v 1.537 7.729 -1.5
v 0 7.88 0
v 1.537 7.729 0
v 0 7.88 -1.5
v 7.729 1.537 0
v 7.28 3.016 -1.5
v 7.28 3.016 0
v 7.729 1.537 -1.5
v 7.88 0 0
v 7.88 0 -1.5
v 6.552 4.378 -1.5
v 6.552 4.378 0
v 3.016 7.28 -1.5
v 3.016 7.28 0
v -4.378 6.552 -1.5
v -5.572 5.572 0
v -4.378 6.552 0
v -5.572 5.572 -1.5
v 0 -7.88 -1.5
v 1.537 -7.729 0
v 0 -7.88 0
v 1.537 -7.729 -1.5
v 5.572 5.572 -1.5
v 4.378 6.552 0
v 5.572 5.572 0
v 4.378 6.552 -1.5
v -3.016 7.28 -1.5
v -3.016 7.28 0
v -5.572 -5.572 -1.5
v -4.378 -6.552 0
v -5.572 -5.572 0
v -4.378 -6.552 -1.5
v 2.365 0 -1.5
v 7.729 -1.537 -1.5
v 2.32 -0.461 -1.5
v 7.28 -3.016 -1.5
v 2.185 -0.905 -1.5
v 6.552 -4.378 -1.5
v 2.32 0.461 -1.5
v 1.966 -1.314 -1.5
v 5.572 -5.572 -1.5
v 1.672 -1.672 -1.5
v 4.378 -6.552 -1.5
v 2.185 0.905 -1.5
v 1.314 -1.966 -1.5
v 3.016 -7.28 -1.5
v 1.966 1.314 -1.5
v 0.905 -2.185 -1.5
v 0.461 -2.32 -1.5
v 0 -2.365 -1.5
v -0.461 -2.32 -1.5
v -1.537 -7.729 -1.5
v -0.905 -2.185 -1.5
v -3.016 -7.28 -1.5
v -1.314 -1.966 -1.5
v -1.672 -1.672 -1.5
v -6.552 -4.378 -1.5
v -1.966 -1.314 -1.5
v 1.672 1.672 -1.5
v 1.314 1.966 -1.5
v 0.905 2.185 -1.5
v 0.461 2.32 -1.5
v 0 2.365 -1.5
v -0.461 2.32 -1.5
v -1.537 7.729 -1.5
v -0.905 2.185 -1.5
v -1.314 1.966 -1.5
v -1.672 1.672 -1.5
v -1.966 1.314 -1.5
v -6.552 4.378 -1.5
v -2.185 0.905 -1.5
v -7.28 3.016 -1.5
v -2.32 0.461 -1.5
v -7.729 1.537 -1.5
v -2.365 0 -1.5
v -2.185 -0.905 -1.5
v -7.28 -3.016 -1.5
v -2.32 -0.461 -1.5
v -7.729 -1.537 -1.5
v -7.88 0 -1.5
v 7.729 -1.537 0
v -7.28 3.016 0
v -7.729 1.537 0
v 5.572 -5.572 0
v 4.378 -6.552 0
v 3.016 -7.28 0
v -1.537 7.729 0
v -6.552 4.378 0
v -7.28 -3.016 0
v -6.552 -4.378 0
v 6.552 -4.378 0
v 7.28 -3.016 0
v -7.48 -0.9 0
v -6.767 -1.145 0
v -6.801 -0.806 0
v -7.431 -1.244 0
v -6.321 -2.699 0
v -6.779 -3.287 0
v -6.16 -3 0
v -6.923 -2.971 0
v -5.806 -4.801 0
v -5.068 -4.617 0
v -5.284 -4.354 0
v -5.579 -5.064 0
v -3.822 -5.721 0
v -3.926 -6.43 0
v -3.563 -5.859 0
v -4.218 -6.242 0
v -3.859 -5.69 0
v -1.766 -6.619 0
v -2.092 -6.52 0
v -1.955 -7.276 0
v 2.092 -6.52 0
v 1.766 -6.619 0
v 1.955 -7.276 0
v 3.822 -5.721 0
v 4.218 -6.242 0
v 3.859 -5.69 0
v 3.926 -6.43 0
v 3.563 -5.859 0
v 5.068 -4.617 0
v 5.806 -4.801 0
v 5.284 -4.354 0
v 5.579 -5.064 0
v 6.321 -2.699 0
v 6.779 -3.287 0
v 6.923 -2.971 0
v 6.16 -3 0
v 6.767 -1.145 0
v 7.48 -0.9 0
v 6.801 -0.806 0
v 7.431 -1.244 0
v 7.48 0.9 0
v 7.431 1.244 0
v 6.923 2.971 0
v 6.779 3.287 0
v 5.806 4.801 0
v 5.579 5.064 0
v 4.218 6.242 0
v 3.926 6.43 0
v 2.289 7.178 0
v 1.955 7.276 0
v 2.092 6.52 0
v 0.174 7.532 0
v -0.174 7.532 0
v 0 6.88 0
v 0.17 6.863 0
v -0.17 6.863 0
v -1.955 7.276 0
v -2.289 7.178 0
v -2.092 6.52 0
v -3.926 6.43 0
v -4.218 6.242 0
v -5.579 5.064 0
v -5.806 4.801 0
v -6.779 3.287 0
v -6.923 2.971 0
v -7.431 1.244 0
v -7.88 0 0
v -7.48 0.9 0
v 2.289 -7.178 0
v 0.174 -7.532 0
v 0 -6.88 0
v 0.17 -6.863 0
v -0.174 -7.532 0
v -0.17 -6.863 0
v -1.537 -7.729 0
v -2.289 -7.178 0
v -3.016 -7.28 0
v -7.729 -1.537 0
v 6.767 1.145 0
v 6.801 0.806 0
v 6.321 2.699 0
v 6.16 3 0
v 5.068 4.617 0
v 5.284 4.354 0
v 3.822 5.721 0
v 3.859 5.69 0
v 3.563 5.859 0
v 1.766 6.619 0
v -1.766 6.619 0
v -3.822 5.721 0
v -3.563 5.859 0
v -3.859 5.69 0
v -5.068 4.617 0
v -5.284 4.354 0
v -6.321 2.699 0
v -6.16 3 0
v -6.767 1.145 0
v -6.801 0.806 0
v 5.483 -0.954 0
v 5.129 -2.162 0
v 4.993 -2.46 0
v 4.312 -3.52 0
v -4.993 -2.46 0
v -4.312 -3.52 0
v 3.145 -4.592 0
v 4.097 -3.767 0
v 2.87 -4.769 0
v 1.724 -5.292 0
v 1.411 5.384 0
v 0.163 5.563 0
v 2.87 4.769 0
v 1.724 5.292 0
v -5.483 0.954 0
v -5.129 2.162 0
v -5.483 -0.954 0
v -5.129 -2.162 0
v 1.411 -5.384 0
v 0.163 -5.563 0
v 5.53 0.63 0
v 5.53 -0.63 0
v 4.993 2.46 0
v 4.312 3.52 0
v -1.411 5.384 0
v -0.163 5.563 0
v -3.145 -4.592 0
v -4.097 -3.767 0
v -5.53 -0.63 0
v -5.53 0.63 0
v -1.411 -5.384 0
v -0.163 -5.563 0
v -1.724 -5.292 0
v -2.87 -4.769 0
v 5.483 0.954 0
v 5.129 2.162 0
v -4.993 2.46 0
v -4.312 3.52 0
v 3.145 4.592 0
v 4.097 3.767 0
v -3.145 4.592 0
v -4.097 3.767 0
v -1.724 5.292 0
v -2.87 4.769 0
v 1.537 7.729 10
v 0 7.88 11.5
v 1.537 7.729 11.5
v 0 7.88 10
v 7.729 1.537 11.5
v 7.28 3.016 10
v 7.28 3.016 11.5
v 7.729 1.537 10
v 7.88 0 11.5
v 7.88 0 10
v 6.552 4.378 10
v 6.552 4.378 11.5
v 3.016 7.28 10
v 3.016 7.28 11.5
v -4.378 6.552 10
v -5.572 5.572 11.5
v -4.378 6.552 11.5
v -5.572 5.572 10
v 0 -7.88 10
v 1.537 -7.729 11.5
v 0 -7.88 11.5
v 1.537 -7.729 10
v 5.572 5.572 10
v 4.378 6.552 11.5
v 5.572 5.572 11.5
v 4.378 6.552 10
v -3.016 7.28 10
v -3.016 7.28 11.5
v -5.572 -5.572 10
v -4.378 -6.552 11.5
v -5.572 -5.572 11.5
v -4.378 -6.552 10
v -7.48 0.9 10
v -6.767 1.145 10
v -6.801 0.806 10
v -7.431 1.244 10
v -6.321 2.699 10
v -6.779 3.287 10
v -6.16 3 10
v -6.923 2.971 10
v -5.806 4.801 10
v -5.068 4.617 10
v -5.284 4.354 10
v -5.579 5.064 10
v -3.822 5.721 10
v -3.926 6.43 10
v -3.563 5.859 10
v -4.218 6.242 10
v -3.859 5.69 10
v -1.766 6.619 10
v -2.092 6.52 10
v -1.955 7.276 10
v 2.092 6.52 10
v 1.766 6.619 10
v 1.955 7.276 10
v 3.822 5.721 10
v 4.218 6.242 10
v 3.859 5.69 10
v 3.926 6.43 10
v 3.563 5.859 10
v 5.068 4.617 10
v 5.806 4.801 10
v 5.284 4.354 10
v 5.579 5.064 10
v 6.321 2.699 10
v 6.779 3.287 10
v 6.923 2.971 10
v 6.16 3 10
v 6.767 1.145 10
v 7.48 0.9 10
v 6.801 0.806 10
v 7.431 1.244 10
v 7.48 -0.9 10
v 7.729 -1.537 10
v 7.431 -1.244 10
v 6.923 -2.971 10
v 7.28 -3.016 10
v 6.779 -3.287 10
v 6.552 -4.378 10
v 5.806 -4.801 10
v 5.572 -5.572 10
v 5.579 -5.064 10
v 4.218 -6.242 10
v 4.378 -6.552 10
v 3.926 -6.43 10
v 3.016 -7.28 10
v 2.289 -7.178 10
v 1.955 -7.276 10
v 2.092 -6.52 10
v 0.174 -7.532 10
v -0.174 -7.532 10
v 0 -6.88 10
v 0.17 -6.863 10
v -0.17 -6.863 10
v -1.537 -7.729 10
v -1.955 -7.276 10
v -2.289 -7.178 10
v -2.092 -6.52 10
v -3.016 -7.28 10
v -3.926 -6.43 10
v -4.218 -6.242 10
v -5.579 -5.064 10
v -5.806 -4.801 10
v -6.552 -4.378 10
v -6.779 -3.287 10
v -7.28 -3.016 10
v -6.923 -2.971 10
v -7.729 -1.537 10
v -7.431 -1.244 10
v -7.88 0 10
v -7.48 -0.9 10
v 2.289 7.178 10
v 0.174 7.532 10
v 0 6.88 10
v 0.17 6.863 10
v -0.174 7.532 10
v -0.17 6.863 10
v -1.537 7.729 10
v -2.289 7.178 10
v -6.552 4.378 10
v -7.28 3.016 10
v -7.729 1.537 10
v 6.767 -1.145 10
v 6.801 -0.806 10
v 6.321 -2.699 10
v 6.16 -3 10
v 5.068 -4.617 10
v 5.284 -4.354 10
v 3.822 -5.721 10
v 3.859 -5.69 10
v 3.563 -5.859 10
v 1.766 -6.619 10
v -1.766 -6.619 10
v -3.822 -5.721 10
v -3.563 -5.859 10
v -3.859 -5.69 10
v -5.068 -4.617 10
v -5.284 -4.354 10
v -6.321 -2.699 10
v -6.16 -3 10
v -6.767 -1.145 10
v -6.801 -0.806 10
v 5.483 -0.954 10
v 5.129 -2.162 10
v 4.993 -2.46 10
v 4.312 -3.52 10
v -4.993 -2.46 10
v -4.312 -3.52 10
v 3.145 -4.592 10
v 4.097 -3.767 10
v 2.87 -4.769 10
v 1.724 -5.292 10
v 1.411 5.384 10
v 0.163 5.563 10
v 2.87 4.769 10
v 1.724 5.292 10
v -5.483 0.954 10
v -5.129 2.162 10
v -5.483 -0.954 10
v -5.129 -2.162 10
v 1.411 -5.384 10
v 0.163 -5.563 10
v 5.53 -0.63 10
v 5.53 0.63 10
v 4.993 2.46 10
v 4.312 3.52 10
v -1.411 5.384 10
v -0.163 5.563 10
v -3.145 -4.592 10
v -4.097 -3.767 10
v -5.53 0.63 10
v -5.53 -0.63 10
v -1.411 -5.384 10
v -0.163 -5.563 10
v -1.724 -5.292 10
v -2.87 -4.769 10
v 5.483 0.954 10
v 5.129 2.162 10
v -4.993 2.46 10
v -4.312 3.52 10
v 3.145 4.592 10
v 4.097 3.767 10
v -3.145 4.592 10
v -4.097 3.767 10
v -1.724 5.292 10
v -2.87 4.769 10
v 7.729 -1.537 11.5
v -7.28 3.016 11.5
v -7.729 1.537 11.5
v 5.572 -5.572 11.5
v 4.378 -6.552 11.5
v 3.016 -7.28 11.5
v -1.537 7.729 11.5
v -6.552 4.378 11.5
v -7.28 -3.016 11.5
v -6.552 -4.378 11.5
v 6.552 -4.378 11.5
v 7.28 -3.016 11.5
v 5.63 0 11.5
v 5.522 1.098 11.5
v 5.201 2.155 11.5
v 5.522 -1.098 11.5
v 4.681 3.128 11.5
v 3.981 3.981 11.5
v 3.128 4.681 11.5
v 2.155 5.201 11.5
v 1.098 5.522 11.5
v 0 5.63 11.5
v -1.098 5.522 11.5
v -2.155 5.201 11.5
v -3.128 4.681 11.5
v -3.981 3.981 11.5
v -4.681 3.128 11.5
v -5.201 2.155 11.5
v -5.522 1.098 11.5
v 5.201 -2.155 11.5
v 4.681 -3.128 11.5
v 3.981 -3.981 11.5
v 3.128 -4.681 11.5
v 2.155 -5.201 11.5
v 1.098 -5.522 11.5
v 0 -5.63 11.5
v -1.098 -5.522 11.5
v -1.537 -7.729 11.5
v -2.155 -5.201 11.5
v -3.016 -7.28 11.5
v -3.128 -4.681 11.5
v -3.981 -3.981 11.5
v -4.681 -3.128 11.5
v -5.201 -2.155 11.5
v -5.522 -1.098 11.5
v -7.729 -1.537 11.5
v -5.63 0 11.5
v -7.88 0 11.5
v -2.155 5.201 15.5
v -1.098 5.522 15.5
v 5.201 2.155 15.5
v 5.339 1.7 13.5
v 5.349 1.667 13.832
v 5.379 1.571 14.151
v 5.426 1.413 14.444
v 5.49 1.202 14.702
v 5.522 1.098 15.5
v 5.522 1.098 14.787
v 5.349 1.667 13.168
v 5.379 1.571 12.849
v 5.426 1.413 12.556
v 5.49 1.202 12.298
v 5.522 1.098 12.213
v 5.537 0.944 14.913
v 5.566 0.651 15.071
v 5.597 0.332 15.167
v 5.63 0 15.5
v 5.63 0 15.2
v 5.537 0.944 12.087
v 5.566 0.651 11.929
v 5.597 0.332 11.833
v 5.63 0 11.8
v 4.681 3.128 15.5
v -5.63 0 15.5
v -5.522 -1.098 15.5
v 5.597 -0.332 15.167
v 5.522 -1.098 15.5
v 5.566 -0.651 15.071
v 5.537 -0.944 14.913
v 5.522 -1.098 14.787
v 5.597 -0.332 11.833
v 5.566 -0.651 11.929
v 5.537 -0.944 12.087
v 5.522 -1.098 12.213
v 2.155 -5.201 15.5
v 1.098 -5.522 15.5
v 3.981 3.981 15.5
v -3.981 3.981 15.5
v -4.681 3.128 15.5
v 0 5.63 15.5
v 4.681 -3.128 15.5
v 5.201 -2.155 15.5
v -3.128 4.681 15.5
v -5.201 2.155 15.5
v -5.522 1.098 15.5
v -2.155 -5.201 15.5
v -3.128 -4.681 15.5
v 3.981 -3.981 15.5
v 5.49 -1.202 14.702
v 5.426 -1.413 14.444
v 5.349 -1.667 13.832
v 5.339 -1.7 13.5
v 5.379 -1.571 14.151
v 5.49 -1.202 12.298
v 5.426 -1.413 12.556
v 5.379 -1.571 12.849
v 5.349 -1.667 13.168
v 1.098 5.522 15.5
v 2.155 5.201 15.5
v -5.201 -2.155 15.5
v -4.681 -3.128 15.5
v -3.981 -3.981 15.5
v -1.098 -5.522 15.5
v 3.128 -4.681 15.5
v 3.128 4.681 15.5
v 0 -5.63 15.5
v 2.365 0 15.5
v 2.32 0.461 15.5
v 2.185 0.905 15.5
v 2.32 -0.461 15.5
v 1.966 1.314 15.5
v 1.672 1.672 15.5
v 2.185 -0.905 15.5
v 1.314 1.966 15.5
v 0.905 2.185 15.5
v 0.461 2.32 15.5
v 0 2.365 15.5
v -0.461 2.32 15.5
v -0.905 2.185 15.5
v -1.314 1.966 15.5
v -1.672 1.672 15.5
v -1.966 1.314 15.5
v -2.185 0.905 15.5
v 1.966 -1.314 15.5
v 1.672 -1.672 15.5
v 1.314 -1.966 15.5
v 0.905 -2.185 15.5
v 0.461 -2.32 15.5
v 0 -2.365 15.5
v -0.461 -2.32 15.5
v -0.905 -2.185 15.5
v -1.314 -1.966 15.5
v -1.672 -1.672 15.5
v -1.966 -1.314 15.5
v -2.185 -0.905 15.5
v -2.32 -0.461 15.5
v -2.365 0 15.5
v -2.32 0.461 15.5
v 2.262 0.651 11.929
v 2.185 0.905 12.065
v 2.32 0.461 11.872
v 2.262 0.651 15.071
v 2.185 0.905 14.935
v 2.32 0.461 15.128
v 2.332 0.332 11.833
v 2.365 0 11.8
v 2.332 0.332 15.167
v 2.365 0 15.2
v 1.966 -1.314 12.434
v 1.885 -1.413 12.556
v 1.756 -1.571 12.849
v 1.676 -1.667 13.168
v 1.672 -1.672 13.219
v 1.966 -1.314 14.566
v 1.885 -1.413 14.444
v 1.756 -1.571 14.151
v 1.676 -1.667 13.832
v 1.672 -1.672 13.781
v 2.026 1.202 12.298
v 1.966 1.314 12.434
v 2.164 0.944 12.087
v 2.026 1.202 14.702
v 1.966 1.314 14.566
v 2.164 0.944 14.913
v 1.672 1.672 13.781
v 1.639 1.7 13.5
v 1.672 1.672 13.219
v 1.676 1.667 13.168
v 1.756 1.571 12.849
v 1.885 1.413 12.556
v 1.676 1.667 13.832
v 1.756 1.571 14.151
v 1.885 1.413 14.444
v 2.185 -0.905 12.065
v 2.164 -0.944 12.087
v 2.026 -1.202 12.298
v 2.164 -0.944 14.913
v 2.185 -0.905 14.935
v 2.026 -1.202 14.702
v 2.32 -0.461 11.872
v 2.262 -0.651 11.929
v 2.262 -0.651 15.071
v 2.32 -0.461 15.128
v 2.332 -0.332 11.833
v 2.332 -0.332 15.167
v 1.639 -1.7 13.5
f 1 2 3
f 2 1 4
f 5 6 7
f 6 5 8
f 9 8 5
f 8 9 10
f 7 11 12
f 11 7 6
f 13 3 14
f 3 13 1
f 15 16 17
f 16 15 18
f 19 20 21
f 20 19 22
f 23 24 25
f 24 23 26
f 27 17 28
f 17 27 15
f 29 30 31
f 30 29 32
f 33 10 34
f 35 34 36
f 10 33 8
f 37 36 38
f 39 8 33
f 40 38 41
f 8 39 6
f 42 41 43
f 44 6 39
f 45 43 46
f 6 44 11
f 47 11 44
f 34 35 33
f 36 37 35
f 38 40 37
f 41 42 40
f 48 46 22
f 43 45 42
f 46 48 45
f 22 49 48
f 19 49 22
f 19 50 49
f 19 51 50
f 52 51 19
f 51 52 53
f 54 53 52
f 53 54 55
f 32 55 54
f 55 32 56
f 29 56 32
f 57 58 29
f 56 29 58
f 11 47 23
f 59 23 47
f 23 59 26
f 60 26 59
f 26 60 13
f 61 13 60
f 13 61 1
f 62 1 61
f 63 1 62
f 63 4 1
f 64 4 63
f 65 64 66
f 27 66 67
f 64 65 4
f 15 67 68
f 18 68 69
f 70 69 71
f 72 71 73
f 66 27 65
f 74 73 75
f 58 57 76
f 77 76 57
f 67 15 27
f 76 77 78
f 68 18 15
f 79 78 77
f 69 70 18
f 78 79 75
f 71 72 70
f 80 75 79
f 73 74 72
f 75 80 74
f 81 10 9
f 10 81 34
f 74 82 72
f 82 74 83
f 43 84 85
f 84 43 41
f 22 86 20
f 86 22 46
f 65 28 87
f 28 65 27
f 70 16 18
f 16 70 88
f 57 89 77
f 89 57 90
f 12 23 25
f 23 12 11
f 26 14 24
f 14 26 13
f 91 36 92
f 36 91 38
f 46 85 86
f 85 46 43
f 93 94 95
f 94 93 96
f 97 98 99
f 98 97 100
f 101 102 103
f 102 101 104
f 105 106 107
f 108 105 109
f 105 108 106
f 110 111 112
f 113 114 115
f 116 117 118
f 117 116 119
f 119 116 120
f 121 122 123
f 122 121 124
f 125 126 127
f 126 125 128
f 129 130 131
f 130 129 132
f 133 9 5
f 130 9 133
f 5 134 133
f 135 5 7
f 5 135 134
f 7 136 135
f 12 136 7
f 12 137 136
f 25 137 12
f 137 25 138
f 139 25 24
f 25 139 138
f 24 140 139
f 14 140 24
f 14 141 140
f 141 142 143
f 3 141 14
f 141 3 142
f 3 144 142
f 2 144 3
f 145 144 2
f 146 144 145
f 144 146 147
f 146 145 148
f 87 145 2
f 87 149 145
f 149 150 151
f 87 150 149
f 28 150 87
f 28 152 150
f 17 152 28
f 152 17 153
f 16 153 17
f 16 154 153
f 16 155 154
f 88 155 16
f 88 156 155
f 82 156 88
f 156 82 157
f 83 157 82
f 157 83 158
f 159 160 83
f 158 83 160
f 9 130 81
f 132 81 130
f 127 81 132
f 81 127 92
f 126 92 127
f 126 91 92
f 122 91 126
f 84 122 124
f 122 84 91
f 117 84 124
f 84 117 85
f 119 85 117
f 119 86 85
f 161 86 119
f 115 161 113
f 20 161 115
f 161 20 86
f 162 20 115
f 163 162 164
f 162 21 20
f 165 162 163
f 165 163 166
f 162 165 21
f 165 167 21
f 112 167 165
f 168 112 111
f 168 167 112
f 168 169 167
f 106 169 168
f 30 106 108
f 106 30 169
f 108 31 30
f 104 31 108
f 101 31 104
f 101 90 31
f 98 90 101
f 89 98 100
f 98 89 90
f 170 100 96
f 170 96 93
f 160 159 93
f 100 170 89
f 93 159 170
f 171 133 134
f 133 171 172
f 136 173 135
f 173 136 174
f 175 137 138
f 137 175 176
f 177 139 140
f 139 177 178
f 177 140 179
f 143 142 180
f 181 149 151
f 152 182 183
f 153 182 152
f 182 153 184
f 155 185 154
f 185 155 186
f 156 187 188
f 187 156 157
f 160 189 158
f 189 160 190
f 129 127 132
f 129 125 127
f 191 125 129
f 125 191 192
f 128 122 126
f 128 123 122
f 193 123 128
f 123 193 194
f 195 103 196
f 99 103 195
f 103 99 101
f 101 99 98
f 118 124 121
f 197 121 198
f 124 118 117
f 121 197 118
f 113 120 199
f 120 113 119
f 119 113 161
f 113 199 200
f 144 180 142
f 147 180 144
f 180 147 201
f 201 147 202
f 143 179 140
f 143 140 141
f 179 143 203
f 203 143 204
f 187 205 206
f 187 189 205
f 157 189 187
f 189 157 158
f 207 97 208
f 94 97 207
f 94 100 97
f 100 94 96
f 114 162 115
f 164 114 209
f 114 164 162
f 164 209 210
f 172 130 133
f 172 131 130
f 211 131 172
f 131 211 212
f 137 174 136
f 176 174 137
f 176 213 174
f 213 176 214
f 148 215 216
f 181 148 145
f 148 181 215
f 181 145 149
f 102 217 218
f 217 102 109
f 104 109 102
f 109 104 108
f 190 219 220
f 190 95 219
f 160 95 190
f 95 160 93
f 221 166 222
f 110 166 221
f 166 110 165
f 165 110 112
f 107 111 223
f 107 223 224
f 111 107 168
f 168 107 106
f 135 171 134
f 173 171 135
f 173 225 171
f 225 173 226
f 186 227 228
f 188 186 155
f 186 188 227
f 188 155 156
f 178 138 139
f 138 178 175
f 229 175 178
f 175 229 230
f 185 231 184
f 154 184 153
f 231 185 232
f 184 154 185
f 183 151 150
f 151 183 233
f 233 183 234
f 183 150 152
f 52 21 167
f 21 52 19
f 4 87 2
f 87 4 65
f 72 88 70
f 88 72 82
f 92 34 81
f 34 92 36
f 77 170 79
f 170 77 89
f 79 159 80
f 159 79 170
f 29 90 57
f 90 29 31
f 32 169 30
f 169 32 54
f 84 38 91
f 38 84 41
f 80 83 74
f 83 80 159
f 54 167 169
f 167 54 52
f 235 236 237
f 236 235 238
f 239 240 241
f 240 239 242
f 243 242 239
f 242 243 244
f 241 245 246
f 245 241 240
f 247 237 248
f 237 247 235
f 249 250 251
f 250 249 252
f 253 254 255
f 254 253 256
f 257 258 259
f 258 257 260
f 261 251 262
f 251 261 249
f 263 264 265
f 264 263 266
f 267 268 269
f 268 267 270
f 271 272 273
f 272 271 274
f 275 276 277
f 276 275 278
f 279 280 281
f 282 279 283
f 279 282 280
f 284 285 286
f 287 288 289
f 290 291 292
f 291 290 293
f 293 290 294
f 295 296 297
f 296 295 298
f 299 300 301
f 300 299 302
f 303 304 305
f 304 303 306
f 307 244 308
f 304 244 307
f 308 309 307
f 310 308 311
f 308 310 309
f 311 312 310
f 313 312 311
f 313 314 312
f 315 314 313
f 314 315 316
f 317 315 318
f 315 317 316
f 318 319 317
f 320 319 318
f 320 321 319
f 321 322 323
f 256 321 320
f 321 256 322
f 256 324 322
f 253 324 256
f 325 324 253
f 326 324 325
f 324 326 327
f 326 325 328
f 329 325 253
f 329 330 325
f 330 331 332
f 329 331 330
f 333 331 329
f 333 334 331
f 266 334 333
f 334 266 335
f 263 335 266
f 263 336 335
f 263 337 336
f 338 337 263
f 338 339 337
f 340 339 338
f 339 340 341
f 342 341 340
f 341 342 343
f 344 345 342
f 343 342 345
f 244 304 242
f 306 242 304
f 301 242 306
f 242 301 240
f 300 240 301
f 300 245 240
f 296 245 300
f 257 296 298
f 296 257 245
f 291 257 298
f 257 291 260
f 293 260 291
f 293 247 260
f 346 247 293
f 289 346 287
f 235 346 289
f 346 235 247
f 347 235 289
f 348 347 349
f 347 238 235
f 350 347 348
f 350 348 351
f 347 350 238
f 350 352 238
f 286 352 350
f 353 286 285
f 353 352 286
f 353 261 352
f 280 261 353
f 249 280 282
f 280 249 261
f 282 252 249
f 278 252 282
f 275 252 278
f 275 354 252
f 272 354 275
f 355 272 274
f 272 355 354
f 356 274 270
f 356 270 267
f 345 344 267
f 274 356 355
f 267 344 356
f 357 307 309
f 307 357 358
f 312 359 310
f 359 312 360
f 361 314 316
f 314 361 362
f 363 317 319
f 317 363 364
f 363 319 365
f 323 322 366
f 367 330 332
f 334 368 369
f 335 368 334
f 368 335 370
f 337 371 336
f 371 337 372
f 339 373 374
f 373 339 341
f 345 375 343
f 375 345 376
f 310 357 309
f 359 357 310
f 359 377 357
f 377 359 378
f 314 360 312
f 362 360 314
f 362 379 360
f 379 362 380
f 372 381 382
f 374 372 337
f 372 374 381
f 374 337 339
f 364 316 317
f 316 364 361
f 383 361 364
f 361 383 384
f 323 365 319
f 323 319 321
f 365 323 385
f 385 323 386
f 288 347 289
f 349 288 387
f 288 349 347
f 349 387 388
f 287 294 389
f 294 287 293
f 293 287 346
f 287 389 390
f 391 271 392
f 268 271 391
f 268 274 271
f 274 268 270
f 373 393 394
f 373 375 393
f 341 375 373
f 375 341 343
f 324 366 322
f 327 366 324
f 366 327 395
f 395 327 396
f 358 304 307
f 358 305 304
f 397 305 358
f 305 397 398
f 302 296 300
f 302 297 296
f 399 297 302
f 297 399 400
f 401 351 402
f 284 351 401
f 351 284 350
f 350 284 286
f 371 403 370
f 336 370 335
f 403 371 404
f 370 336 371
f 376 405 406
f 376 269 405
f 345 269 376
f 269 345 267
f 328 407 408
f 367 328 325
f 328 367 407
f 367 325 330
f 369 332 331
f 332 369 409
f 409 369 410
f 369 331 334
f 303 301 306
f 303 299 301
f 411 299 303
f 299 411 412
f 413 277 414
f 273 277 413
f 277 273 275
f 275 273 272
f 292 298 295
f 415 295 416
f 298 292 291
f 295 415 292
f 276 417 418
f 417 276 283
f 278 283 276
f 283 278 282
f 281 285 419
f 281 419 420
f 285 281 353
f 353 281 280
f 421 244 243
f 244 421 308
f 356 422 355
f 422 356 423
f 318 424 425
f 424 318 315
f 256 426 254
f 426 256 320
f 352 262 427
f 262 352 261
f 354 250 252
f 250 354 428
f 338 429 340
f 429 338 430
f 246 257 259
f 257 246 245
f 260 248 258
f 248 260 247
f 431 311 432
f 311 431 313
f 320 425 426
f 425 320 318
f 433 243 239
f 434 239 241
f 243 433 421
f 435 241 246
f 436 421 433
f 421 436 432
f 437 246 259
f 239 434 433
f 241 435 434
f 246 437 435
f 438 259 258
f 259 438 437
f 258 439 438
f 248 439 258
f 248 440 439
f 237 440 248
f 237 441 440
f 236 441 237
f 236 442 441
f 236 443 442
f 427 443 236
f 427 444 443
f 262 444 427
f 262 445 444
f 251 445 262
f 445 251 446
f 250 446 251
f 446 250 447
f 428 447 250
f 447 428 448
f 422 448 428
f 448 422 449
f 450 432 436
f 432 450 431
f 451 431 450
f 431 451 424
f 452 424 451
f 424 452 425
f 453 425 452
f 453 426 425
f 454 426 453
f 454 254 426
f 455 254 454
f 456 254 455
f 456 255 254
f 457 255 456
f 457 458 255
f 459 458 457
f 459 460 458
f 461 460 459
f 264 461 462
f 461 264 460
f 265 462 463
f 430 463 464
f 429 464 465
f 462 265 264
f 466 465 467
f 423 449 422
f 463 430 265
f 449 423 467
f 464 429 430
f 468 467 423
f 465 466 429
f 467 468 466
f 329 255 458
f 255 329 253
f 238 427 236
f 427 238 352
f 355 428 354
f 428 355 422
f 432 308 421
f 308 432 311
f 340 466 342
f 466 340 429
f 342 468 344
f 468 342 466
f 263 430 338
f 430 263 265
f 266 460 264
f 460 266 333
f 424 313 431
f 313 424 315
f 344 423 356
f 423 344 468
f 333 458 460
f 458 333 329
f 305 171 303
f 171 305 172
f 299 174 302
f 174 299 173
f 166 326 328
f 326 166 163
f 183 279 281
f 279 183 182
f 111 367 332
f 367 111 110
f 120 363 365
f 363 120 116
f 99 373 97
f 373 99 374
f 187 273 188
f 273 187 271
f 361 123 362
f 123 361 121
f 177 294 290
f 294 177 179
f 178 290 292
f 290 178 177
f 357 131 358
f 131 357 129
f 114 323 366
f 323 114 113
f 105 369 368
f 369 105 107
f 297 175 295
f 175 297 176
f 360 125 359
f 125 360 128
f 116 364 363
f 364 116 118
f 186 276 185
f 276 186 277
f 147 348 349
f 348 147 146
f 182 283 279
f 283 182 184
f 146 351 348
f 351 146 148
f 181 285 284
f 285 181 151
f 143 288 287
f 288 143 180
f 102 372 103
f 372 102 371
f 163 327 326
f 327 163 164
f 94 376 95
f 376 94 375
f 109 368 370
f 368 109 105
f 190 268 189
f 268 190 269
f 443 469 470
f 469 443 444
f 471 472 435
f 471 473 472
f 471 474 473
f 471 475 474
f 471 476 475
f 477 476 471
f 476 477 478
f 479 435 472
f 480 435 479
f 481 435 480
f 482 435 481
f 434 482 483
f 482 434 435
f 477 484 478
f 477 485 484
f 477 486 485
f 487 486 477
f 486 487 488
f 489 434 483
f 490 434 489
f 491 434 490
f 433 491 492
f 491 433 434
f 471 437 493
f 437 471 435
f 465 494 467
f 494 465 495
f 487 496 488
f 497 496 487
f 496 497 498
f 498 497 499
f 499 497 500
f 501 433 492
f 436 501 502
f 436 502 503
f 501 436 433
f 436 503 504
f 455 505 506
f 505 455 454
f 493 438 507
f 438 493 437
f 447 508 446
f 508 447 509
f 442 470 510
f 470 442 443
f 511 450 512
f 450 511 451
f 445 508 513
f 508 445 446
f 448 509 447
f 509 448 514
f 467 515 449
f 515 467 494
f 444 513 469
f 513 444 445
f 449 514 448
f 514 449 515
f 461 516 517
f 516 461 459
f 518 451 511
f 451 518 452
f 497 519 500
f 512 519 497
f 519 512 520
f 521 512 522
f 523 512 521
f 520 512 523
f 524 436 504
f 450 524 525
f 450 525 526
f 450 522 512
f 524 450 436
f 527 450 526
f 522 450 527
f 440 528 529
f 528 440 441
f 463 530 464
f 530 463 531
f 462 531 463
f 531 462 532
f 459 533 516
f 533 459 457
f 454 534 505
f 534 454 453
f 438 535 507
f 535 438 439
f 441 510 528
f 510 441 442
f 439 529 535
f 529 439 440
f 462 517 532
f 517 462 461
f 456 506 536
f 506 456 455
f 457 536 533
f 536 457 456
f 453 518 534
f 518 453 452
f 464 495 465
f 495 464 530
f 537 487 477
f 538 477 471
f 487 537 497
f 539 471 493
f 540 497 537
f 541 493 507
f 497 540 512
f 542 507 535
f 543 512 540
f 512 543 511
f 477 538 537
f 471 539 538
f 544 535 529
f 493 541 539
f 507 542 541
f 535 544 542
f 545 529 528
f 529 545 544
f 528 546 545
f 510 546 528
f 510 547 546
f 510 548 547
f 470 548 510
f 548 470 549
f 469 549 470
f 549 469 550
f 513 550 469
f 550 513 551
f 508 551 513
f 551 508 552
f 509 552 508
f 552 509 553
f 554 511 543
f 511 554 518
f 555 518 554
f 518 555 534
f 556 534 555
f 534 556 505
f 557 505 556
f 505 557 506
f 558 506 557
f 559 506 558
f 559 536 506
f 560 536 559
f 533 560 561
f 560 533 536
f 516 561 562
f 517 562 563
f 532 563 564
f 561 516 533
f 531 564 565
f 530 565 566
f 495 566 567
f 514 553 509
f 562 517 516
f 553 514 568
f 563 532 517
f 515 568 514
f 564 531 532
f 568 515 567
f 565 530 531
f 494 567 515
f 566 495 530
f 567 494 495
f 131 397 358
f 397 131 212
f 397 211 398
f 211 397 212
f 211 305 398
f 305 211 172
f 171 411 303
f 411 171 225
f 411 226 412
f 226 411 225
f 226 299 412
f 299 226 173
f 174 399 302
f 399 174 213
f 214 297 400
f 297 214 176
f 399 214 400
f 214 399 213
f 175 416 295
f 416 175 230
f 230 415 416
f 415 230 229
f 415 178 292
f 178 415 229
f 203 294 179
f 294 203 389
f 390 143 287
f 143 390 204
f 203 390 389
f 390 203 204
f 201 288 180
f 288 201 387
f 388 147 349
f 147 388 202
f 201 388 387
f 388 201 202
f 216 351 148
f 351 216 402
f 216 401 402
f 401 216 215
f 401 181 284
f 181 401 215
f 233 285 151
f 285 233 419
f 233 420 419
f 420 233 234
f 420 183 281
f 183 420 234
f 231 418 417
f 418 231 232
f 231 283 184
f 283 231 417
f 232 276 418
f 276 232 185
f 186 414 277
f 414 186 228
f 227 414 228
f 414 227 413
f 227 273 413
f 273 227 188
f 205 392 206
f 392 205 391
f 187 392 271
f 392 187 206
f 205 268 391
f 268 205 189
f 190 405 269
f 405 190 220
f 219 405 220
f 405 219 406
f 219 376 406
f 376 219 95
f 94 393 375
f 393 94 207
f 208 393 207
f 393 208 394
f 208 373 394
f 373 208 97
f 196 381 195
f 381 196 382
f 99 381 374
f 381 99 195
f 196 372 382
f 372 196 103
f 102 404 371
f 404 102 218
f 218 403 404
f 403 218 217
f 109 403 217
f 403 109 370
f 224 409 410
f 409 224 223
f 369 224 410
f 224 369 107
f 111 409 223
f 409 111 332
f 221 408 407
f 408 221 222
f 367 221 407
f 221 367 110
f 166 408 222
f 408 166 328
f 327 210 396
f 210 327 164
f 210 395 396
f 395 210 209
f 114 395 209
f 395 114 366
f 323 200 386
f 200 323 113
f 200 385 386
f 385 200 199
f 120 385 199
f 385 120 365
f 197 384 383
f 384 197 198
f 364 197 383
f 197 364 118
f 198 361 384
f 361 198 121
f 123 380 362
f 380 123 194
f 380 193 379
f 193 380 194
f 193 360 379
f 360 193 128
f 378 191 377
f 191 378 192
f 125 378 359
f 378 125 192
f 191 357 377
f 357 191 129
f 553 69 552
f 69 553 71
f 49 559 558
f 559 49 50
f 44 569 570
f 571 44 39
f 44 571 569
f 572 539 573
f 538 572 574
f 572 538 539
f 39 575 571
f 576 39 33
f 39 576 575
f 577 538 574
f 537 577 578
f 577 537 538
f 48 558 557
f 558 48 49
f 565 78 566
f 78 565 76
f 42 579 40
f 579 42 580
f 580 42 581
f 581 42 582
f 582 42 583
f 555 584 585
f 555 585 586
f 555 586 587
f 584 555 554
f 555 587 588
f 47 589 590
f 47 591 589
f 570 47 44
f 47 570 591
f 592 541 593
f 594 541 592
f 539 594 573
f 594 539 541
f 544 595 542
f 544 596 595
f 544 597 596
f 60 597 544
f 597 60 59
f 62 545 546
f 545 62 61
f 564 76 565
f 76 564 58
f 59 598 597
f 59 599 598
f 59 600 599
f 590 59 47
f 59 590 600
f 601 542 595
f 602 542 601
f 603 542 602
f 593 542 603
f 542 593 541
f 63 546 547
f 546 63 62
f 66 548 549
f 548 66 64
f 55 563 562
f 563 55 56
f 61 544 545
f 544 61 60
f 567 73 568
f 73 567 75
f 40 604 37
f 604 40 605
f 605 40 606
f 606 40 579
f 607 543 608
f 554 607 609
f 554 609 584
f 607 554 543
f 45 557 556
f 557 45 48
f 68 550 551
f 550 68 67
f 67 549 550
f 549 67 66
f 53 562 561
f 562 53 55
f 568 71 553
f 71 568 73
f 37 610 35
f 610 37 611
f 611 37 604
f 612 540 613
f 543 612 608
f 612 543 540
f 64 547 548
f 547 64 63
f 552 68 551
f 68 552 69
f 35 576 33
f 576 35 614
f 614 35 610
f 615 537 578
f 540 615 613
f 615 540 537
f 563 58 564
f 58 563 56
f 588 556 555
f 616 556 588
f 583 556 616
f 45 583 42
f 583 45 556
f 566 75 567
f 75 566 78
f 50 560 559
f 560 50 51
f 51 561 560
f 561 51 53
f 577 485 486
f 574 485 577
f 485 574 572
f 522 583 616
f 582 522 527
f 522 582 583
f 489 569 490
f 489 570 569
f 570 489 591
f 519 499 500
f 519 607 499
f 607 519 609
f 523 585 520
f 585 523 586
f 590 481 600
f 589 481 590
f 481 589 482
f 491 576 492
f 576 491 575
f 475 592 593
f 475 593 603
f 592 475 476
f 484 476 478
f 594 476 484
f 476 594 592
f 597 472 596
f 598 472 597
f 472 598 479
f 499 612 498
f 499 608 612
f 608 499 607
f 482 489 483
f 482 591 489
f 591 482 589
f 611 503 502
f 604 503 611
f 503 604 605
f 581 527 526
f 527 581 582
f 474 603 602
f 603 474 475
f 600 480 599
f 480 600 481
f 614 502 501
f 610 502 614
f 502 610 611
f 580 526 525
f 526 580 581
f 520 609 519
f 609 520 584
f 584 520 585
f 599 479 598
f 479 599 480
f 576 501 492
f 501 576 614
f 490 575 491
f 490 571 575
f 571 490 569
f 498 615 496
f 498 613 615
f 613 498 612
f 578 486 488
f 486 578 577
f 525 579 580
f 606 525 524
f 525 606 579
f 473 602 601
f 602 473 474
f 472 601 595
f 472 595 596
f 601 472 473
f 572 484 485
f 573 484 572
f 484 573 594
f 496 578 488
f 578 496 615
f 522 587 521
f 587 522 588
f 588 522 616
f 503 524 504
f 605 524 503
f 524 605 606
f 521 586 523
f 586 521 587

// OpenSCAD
$fn = 32;

// ----------------------------------------------------------------------
// Timing pulley: GT2 22T, pitch 2 mm, 15.76 mm x 17 mm
// ----------------------------------------------------------------------

// --- parameters (mm) ---
pitch_mm = 2;             // belt pitch
tooth_count = 22;         // number of grooves
width = 10;               // belt width between the flanges
tip_d = 13.76;            // tip circle diameter
root_d = 12.26;           // groove bottom diameter
groove_h = 0.75;          // groove depth
tooth_w = 1.5;            // groove width at the tip circle
side_d = 15.76;           // flange diameter
side_t = 1.5;             // flange thickness
spigot_d = 10.66;         // flange spigot, sunk into the rim
spigot_h = 1.2;           // spigot depth into the rim
hub_bore = 4.73;          // shaft bore
hub_d = 11.26;            // hub diameter
hub_h = 4;                // hub above the flange
bottom_z = -1.5;          // lowest point of the pulley
top_z = 15.5;             // highest point of the pulley
set_d = 3.4;              // set screw tap hole

module rim() {
  cylinder(h = width, d = tip_d);
}

module groove_cutter() {
  /* belt tooth groove: deeper than wide, cut through the belt width */
  translate([root_d / 2, 0, 0])
    linear_extrude(height = width)
      polygon(points = [[-0.6, -tooth_w * 0.42], [groove_h + 0.6, -tooth_w * 0.6],
                        [groove_h + 0.6, tooth_w * 0.6], [-0.6, tooth_w * 0.42]]);
}

module flanges() {
  translate([0, 0, -side_t]) cylinder(h = side_t, d = side_d);
  translate([0, 0, width]) cylinder(h = side_t, d = side_d);
  translate([0, 0, -spigot_h]) cylinder(h = spigot_h + 0.6, d = spigot_d);
  translate([0, 0, width - 0.6]) cylinder(h = spigot_h + 0.6, d = spigot_d);
}

module hub() {
  translate([0, 0, bottom_z]) cylinder(h = top_z - bottom_z, d = hub_d);
}

difference() {
  union() {
    rim();
    hub();
    flanges();
  }
  for (i = [0 : tooth_count - 1]) rotate([0, 0, i * 360 / tooth_count]) groove_cutter();
  translate([0, 0, bottom_z - 1]) cylinder(h = top_z - bottom_z + 2, d = hub_bore);
  translate([-1, 0, top_z - hub_h * 0.5]) rotate([0, 90, 0]) cylinder(h = hub_d / 2 + 3, d = set_d);
}
